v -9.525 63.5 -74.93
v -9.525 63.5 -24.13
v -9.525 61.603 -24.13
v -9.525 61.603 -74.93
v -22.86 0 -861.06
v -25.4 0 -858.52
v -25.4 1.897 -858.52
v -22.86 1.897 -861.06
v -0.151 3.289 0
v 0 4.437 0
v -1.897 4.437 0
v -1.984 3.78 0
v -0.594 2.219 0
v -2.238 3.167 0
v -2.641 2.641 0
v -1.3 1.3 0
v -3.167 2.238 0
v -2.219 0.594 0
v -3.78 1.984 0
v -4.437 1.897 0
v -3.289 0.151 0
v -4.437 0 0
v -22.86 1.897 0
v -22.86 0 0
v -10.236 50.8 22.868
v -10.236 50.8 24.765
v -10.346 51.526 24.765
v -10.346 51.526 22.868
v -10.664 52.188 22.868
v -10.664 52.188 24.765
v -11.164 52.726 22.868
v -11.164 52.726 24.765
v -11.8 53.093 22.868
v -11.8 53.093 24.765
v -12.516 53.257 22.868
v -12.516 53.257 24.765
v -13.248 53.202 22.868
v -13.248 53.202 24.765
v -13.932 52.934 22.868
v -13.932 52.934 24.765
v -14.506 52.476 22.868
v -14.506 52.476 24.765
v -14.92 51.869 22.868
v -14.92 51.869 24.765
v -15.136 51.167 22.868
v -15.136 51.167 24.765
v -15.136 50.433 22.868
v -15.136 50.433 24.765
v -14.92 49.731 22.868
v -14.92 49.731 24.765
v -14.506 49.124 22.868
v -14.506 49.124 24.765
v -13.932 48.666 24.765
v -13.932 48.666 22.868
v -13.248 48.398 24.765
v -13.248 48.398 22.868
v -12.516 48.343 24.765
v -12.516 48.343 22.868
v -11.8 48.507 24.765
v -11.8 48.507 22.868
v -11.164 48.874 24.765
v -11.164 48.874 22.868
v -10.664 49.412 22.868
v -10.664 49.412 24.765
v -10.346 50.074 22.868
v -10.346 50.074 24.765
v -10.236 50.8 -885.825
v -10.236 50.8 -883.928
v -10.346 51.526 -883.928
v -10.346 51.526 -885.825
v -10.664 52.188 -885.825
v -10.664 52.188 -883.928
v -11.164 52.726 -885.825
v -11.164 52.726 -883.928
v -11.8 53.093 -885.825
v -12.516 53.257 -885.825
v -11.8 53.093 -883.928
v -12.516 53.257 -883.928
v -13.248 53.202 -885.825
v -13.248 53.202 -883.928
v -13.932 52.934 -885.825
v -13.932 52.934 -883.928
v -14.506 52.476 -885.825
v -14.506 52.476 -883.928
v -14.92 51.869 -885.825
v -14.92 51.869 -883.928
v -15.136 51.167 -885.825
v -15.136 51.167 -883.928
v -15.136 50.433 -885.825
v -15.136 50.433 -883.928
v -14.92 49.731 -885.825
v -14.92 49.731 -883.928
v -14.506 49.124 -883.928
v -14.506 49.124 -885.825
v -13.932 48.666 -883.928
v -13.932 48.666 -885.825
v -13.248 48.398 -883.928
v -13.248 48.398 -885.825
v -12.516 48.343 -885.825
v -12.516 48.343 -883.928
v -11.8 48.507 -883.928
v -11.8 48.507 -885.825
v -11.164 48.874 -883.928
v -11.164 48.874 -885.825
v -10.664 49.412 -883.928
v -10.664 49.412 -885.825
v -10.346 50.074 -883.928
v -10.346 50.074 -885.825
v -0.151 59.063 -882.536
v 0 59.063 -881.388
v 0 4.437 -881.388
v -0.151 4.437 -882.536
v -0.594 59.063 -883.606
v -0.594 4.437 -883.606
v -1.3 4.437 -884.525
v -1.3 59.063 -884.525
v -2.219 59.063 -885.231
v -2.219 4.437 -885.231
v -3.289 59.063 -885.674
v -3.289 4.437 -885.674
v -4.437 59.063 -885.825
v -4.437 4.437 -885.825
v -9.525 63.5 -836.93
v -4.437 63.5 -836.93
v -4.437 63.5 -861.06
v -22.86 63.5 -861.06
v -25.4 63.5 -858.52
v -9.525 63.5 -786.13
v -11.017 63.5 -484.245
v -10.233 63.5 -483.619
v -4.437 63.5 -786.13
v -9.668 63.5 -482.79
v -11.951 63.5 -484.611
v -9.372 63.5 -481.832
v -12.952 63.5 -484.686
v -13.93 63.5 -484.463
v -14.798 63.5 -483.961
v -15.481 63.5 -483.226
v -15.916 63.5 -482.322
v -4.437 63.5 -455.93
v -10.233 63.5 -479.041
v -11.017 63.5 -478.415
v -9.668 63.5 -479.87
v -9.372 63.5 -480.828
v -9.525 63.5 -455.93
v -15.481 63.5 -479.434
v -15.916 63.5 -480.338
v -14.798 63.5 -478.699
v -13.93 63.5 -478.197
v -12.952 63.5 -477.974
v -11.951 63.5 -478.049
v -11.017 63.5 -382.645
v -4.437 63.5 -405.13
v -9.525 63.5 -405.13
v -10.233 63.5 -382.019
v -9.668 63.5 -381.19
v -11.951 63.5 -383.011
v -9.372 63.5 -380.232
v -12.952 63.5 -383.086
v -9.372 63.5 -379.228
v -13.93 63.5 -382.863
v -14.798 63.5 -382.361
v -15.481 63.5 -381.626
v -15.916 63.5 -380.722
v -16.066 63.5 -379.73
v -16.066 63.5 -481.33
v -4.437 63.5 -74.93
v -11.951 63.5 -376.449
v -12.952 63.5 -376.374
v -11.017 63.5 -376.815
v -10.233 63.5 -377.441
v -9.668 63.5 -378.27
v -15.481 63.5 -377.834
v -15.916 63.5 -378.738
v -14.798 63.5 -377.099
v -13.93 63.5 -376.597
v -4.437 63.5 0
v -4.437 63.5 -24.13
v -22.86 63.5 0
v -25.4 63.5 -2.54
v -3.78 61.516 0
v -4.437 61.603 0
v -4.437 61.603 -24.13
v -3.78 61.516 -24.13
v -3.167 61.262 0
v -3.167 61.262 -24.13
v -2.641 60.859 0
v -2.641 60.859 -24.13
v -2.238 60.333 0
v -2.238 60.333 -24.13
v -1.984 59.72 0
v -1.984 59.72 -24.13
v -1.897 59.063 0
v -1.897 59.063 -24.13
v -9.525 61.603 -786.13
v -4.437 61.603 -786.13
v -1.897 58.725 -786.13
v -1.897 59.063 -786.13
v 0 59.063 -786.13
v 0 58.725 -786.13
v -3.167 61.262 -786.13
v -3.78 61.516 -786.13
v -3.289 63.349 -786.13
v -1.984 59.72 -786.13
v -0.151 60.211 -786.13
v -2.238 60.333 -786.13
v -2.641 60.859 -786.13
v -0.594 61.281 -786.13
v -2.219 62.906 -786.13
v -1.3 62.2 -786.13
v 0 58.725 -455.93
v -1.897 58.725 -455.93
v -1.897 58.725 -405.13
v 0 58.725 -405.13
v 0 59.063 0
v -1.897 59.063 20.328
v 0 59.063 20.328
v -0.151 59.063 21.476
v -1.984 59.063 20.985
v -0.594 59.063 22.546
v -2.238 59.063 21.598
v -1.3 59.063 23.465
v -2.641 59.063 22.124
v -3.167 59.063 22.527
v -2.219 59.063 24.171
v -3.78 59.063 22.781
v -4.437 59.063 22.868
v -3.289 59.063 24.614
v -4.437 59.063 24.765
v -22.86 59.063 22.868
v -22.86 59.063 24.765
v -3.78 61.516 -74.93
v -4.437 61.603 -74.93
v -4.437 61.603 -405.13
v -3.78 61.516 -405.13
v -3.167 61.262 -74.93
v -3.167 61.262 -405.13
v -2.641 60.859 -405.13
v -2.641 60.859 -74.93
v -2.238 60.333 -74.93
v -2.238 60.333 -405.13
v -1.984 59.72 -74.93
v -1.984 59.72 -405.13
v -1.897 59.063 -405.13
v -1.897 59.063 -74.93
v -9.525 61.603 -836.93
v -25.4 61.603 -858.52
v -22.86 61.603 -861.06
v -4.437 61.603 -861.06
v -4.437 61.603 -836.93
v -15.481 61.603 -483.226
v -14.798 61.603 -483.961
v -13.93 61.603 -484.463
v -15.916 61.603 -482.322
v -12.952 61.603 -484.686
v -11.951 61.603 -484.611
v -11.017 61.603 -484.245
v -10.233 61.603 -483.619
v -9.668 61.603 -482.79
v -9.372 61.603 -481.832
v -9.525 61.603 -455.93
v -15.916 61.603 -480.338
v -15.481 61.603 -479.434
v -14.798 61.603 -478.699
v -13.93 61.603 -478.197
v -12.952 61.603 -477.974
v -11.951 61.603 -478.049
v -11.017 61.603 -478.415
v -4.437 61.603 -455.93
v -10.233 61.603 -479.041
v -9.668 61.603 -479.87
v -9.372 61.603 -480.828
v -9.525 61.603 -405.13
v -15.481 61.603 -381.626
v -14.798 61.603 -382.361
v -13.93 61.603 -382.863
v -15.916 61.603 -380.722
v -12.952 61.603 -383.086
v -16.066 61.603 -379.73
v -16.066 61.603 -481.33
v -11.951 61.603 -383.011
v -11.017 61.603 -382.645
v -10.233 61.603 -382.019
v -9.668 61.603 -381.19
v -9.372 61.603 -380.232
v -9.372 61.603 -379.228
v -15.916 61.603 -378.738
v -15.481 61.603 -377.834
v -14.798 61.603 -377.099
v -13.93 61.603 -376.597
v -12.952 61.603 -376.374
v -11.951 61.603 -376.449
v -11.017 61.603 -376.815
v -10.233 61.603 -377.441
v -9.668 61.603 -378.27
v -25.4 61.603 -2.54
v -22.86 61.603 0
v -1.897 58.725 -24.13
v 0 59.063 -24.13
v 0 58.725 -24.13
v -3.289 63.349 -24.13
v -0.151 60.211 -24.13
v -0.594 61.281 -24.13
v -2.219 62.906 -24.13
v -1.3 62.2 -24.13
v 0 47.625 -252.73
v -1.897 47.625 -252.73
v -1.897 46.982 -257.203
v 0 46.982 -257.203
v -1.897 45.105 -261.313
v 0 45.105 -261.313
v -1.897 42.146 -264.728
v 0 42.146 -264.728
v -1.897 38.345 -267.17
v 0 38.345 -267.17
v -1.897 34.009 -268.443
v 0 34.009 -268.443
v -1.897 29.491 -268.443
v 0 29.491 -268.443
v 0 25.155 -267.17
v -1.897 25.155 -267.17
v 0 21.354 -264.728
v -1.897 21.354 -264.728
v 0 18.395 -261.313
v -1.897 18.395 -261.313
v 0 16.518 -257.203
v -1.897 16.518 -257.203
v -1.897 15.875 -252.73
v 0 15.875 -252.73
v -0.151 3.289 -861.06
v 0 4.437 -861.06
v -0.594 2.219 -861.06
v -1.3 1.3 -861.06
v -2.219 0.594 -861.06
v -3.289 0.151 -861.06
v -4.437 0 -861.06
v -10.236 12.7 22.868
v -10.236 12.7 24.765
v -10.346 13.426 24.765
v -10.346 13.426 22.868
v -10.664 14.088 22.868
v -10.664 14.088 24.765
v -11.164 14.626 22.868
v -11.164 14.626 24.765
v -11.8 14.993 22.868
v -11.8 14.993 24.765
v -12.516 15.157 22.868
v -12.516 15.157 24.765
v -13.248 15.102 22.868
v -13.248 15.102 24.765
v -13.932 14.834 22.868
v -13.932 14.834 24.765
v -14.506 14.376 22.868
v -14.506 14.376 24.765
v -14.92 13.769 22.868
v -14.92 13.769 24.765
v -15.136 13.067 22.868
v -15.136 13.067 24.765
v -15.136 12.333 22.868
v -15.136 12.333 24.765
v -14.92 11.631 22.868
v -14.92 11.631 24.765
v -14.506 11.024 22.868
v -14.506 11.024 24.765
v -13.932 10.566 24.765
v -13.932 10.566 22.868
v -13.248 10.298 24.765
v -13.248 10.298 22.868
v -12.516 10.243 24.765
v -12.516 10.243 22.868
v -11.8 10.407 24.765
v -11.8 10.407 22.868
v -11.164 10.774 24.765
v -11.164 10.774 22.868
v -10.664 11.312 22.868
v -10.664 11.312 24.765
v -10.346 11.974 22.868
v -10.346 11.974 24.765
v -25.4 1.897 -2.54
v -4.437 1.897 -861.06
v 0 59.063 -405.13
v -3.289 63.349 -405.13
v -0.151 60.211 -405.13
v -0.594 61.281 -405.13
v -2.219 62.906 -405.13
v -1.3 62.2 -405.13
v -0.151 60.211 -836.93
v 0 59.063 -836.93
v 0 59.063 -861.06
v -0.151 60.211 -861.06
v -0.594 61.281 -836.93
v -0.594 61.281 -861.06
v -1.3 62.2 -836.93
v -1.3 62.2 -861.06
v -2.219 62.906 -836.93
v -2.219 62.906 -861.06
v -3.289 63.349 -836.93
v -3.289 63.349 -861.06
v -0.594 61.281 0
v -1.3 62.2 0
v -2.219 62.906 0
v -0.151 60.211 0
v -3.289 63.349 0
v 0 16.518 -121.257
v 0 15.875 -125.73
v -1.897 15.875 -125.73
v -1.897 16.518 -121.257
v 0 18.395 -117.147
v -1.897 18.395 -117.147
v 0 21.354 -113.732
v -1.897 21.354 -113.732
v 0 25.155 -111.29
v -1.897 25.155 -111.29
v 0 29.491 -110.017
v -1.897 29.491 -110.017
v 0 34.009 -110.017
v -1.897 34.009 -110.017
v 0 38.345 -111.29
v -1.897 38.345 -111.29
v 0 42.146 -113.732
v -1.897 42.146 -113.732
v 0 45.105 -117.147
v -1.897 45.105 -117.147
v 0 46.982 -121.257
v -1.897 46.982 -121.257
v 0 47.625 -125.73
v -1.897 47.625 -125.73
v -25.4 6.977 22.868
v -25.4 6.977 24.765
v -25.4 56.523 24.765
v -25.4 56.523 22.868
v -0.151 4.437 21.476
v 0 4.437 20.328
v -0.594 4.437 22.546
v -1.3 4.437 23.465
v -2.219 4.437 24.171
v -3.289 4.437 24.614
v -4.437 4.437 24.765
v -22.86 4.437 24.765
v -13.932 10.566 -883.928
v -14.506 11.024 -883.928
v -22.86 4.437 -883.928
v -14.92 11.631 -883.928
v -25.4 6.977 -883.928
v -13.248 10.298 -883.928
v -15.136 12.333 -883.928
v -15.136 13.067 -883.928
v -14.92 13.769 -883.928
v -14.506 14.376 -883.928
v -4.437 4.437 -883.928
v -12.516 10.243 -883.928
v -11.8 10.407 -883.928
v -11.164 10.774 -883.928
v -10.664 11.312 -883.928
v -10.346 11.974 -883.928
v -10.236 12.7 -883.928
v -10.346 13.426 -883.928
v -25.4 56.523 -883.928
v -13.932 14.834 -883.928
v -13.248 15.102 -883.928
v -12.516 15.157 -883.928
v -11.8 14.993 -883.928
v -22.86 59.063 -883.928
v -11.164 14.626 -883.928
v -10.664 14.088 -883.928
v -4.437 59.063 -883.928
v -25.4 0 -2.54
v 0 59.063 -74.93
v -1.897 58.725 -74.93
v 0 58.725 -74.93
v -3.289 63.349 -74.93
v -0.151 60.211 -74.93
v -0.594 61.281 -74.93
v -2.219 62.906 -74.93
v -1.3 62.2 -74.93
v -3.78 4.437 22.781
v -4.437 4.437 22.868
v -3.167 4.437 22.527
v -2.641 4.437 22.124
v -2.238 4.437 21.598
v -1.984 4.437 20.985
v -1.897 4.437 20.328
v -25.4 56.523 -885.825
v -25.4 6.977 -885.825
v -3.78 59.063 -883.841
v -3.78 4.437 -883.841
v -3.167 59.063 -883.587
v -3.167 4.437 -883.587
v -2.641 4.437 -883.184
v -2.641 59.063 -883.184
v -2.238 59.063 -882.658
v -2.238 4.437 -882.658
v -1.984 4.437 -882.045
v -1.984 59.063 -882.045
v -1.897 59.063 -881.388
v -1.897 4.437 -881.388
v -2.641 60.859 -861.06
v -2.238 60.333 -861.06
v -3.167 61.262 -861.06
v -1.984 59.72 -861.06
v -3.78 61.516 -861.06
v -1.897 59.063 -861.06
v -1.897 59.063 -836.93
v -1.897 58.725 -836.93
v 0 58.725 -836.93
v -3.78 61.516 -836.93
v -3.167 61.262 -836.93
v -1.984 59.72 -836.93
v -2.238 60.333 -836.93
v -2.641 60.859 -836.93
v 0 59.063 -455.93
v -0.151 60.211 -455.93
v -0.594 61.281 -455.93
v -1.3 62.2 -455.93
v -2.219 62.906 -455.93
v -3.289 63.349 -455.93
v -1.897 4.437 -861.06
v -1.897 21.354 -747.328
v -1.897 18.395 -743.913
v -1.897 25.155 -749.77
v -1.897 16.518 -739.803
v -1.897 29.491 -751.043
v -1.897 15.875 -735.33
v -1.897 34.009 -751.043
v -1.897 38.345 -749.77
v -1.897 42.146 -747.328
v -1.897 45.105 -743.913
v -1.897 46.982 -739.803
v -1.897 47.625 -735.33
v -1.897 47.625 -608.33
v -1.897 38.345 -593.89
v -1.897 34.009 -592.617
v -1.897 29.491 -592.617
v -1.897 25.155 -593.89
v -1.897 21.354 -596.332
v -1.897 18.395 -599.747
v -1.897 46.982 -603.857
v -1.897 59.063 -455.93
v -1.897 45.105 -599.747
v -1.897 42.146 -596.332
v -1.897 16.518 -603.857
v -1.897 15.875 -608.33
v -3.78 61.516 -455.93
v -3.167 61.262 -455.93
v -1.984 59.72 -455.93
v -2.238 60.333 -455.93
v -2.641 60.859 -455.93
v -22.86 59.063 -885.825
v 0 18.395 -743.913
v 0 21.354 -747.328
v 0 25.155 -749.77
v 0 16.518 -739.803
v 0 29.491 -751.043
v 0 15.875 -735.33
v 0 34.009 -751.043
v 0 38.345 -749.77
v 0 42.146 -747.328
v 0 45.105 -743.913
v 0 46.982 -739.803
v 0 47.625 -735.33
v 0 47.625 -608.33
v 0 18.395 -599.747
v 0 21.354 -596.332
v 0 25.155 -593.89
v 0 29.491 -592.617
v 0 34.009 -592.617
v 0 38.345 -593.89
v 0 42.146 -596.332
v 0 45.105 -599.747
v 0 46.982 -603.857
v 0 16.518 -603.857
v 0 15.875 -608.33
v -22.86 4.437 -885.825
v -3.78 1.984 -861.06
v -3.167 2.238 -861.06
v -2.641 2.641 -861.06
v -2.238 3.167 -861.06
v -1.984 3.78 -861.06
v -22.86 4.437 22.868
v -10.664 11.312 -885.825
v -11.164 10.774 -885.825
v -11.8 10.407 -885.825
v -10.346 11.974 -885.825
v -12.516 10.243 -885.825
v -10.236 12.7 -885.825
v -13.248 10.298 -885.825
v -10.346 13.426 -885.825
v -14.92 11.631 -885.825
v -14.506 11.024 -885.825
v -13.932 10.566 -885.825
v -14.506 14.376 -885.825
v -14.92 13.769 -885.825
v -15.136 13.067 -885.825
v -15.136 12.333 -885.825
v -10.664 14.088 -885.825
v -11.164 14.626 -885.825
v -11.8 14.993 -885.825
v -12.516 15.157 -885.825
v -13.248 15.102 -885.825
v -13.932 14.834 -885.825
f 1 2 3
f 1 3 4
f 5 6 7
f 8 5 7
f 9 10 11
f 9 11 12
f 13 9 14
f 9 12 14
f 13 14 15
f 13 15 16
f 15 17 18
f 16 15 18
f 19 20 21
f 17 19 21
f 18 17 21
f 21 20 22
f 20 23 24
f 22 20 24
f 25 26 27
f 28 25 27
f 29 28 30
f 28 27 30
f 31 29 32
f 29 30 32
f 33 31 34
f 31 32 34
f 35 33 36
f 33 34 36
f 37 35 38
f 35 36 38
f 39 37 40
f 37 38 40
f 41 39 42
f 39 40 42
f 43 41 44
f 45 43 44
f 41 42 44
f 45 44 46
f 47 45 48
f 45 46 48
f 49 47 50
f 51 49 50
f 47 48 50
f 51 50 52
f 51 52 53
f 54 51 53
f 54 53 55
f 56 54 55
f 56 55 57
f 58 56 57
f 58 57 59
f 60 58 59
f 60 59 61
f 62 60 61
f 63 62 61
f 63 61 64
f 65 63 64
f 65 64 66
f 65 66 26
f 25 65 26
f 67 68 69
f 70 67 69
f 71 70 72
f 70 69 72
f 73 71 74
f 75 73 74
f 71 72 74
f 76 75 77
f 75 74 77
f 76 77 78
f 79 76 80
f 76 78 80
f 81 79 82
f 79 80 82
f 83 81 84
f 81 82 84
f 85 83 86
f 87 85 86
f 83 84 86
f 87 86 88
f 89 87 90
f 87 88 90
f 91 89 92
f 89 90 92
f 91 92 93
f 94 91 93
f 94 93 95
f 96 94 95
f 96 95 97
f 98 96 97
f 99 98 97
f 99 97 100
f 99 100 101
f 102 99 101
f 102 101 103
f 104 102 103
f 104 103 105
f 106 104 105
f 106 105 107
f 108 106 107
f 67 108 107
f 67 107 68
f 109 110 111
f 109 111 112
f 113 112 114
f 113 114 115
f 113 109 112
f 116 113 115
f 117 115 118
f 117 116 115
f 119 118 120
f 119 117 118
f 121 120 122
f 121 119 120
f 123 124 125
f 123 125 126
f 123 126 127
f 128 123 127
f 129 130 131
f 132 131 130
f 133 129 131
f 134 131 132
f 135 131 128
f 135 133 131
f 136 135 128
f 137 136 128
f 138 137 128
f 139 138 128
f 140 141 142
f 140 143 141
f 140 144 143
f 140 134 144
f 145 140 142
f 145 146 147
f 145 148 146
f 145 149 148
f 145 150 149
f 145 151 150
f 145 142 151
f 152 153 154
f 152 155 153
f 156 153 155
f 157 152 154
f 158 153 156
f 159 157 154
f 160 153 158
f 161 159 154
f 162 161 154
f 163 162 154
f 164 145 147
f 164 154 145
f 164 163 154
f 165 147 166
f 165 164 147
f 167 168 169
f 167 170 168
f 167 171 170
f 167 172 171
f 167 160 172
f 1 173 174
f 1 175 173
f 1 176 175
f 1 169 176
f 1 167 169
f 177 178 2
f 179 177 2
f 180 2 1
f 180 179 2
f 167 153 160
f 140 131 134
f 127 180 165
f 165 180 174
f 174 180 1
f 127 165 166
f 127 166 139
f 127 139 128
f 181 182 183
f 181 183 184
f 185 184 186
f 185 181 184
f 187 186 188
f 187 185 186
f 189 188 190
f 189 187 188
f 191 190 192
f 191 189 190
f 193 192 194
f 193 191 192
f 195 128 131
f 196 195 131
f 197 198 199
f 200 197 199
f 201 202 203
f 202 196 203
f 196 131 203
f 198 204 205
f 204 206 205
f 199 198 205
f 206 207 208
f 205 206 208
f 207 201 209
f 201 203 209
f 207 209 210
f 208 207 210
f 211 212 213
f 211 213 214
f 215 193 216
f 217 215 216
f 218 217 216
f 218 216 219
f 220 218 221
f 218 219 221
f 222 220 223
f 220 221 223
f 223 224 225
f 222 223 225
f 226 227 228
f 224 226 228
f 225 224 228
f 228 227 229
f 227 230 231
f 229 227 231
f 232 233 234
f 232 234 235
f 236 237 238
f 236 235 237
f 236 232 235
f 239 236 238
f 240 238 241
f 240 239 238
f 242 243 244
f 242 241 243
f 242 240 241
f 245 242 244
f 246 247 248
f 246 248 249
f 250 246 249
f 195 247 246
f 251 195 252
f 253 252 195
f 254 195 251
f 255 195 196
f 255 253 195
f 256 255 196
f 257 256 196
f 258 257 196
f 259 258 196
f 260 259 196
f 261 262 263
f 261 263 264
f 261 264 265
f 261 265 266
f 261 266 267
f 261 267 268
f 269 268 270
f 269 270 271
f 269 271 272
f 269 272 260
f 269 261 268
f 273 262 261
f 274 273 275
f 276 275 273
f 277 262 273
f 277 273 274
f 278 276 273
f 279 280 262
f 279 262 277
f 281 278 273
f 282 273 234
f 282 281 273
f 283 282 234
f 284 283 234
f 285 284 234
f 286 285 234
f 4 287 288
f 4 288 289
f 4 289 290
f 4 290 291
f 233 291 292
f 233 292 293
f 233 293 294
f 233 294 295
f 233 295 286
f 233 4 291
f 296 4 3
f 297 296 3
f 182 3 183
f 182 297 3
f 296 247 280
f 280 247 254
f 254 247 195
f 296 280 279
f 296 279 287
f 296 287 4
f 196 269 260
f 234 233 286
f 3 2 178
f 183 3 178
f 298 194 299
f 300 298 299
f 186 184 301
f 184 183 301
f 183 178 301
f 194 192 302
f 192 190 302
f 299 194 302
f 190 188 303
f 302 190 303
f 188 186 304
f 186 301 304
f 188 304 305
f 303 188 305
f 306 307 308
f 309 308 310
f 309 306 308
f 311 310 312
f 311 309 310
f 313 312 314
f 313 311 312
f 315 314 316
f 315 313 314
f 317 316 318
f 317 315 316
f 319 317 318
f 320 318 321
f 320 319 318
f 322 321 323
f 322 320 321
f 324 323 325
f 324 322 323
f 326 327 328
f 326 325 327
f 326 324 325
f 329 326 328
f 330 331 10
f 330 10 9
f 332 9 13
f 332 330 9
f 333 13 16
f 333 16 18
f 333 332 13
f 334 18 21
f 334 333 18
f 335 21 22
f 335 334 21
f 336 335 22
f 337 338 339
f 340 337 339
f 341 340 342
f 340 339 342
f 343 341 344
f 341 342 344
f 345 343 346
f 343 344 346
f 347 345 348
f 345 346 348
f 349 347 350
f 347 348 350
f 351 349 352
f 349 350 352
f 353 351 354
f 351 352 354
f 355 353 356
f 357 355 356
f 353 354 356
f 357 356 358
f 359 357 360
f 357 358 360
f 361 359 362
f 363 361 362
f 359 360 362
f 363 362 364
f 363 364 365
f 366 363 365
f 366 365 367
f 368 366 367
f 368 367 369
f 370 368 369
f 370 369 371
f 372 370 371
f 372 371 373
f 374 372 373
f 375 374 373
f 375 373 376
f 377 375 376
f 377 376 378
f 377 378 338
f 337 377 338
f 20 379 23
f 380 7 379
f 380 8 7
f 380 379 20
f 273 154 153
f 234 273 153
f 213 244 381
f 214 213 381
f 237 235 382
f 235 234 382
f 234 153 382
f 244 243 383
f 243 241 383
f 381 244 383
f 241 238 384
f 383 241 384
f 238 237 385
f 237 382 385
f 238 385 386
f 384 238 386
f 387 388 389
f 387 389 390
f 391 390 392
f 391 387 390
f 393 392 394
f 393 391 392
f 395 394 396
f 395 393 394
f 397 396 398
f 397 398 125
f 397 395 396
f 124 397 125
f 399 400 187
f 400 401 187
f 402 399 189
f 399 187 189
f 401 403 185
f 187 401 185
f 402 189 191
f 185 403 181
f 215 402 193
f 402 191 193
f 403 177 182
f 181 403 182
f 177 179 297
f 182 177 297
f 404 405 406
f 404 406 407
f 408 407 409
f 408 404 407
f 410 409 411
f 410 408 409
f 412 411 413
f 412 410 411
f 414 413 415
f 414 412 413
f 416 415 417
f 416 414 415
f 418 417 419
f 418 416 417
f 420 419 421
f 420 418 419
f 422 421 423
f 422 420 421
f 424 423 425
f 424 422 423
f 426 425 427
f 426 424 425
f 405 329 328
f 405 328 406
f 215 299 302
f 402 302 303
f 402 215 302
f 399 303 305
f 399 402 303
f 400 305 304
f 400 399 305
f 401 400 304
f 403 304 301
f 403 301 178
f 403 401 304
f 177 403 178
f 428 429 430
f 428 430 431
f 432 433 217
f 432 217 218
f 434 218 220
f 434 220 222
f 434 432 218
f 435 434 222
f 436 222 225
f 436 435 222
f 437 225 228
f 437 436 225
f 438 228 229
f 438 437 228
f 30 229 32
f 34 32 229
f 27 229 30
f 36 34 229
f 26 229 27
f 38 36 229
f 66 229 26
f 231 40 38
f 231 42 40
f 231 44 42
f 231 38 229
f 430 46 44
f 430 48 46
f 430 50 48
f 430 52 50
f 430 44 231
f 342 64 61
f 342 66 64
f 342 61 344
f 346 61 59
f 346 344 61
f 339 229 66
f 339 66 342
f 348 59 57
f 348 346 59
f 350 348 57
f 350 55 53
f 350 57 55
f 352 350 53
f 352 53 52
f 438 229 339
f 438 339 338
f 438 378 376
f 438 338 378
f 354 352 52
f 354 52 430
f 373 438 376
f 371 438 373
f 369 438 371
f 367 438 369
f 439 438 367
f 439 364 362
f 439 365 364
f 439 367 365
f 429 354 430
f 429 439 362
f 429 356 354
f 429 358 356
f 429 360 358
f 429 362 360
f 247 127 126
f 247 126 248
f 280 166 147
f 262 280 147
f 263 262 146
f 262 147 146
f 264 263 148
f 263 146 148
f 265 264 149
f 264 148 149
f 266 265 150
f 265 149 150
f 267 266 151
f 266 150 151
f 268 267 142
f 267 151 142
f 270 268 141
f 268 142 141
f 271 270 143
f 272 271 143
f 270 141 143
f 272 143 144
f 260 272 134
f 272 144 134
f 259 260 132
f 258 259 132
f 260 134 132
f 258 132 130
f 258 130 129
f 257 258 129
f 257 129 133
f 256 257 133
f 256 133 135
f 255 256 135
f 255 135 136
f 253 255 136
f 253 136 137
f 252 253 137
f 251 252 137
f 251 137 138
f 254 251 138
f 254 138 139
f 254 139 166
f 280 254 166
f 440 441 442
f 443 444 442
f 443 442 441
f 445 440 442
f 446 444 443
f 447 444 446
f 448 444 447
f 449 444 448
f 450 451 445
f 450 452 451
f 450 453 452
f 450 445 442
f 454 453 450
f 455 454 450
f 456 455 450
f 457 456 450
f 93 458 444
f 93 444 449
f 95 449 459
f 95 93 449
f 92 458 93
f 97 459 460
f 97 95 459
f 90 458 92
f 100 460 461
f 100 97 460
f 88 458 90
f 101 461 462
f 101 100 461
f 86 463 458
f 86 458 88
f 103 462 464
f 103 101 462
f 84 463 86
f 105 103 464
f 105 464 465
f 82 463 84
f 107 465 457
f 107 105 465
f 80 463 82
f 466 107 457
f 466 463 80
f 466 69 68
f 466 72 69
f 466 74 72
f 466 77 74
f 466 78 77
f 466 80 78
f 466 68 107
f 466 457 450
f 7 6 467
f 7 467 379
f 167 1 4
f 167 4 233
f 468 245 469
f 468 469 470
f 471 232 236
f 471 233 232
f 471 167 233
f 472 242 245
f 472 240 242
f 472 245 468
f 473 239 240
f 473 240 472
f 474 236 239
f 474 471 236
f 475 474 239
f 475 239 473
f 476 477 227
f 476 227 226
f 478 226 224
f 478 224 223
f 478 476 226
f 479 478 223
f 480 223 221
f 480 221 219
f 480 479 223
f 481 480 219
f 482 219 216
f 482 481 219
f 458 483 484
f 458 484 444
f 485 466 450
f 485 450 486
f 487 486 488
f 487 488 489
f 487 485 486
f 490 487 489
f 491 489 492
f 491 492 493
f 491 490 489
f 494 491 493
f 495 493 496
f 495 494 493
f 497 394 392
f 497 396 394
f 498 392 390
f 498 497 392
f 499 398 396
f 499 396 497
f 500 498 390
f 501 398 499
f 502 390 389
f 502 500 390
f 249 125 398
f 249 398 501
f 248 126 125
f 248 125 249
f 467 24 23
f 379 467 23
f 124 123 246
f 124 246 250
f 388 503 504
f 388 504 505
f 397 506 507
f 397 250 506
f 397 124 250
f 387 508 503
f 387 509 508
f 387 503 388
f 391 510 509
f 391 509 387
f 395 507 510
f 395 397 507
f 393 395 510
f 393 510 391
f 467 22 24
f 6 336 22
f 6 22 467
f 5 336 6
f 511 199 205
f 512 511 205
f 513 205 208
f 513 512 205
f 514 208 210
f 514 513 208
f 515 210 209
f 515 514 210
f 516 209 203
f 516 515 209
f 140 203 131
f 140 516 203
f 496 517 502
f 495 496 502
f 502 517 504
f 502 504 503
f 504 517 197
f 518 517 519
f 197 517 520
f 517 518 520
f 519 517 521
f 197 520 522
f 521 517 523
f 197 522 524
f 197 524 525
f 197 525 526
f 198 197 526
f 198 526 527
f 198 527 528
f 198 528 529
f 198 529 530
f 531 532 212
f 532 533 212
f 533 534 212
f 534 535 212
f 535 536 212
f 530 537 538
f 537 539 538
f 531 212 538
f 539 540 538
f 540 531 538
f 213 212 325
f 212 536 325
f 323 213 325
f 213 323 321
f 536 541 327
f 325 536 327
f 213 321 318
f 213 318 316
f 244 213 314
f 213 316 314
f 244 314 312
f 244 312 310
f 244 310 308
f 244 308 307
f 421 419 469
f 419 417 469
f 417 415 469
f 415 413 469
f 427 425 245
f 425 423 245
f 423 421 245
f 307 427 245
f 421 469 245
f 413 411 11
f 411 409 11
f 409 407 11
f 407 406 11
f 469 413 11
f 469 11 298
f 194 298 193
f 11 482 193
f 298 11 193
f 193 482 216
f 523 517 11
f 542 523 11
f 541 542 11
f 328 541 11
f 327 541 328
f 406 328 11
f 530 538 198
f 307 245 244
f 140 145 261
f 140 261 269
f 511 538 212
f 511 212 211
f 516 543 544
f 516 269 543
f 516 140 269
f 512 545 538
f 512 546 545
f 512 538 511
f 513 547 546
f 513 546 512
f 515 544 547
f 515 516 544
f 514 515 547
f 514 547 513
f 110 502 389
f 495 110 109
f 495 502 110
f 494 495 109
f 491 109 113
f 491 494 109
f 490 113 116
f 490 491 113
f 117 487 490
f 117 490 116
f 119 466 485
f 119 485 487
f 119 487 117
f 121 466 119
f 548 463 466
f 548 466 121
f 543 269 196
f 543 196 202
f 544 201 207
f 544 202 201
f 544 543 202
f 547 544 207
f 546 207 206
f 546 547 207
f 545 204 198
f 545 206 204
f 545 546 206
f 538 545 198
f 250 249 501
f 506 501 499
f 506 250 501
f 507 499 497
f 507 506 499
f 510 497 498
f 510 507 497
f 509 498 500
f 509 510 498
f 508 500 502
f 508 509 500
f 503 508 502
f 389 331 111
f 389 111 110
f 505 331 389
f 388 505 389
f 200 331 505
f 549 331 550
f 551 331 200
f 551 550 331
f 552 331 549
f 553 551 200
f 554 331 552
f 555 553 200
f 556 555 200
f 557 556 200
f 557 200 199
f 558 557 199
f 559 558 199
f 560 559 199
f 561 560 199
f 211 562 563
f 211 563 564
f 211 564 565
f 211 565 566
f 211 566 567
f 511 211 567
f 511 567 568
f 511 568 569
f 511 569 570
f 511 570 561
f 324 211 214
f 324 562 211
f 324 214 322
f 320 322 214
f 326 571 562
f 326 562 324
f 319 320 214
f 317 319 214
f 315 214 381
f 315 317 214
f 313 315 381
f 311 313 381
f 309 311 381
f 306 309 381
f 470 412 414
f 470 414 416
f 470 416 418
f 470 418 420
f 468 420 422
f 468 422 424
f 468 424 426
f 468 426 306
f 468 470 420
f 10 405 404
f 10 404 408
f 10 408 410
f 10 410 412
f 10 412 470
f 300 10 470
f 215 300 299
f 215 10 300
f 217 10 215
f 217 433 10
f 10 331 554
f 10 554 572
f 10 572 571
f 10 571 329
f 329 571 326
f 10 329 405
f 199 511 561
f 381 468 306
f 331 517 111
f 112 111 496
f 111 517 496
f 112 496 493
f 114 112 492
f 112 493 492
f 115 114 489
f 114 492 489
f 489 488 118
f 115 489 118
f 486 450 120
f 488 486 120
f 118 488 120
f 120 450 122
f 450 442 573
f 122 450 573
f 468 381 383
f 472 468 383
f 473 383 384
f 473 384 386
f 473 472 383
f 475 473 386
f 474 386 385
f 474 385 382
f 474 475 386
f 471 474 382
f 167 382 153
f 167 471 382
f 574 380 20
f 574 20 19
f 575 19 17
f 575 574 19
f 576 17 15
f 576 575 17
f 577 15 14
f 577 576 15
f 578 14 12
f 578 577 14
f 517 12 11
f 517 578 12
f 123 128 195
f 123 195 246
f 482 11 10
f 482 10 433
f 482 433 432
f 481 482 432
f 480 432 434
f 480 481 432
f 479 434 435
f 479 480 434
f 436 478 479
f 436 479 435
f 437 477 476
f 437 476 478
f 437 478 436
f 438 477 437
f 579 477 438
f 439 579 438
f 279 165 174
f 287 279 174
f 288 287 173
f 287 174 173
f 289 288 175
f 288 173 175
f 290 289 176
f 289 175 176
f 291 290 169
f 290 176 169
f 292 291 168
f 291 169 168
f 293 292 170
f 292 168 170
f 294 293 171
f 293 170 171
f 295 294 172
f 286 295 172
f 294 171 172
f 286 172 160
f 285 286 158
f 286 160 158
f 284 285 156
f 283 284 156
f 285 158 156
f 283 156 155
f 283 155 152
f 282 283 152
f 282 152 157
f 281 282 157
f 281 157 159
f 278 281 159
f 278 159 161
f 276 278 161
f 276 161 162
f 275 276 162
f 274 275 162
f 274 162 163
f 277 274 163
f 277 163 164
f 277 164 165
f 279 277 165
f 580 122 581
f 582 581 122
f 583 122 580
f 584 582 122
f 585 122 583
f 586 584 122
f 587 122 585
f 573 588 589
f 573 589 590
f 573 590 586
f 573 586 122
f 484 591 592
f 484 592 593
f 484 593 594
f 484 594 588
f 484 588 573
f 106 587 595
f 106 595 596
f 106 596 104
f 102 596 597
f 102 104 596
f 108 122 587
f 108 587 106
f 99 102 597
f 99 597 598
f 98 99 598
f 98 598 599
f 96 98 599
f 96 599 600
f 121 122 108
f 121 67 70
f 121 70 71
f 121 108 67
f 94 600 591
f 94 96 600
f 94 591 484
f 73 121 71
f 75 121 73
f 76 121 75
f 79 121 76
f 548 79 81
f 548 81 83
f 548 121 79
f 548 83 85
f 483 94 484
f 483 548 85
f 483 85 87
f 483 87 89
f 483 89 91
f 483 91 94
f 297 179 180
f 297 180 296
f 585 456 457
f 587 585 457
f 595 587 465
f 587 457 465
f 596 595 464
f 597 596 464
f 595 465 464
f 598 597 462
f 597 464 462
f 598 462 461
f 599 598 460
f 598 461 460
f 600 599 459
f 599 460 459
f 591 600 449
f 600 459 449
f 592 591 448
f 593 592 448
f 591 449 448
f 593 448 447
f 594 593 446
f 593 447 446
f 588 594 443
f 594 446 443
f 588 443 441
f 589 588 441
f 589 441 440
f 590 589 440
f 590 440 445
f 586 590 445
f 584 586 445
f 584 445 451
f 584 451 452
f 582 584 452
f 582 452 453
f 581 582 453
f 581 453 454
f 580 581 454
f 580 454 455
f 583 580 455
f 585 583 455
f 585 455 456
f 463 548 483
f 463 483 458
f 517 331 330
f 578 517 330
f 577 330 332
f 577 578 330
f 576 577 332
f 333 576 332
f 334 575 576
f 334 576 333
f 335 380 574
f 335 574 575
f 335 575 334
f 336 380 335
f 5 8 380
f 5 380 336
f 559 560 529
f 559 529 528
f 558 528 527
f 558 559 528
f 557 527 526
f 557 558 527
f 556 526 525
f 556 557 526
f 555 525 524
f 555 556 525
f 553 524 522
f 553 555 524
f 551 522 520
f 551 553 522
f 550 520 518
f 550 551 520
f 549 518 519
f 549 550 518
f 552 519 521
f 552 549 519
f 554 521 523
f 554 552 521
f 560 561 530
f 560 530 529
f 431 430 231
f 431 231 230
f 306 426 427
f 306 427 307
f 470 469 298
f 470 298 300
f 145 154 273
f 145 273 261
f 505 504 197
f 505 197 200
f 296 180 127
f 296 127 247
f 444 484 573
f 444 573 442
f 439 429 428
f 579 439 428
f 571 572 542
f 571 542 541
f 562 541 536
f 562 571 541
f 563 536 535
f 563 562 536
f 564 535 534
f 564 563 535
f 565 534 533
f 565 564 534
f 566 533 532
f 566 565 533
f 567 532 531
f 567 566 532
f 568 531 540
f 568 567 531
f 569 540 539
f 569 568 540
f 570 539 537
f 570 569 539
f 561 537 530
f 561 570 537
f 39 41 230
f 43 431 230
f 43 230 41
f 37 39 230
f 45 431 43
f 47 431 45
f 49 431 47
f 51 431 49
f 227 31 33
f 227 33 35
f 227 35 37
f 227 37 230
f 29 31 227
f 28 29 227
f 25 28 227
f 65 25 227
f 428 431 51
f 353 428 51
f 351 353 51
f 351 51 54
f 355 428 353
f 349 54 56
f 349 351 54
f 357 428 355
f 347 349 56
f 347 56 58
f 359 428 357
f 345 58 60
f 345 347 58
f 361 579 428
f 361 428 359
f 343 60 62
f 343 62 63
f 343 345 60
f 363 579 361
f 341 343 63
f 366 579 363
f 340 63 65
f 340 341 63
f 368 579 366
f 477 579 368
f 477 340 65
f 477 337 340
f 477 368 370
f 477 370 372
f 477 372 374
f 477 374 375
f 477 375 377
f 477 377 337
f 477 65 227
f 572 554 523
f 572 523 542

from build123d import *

# Parameters (mm, degrees)
SKETCH1_W                      = 861.06
SKETCH1_H                      = 63.5
BASE_FLANGE1_DEPTH             = 1.89738
EDGE_FLANGE1_STRIP_W           = 12.66952
EDGE_FLANGE1_STRIP_H           = 1.89738
EDGE_FLANGE1_STRIP_CUT_DEPTH   = 861.06
EDGE_FLANGE1_STRIP_2_W         = 12.66952
EDGE_FLANGE1_STRIP_2_H         = 1.89738
EDGE_FLANGE1_STRIP_CUT_2_DEPTH = 861.06
EDGE_FLANGE1_DEPTH             = 861.06
EDGE_FLANGE1_BEND_DEPTH        = 861.06
SKETCH12_W                     = 1.89738
SKETCH12_H                     = 54.62524
BOSS_EXTRUDE1_DEPTH            = 24.765
EDGE_FLANGE2_STRIP_W           = 12.66952
EDGE_FLANGE2_STRIP_H           = 1.89738
EDGE_FLANGE2_STRIP_CUT_DEPTH   = 54.62524
EDGE_FLANGE2_STRIP_2_W         = 12.66952
EDGE_FLANGE2_STRIP_2_H         = 1.89738
EDGE_FLANGE2_STRIP_CUT_2_DEPTH = 54.62524
EDGE_FLANGE2_DEPTH             = 54.62524
EDGE_FLANGE2_BEND_DEPTH        = 54.62524
SKETCH16_W                     = 9.525
SKETCH16_H                     = 50.8
CUT_EXTRUDE1_DEPTH             = 4.7752
LPATTERN1_COUNT                = 3
LPATTERN1_PITCH                = 381
SKETCH17_R                     = 3.3655
CUT_EXTRUDE2_DEPTH             = 2.54
CUT_EXTRUDE3_DEPTH             = 2.54
LPATTERN2_COUNT                = 2
LPATTERN2_PITCH                = 482.6
SKETCH25_R                     = 2.4638
CUT_EXTRUDE4_DEPTH             = 914.154728455
CHAMFER1_SIZE                  = 2.54


# Sheet-metal steps are written as plain solids
with BuildPart() as part:
    # Sketch1 → Base-Flange1 (new body)
    with BuildSketch(Plane(origin=(0, 0, 0), x_dir=(0, 0, -1), z_dir=(1, 0, 0))):
        with Locations((430.53, 31.75)):
            Rectangle(SKETCH1_W, SKETCH1_H)
    extrude(amount=-BASE_FLANGE1_DEPTH)

    # Edge-Flange1 strip (across the edge) → Edge-Flange1 strip cut (cut)
    with BuildSketch(Plane(origin=(-1.89738, 63.5, 0), x_dir=(0, -1, 0), z_dir=(0, 0, -1))):
        with Locations((-1.89738, -0.94869)):
            Rectangle(EDGE_FLANGE1_STRIP_W, EDGE_FLANGE1_STRIP_H)
    extrude(amount=EDGE_FLANGE1_STRIP_CUT_DEPTH, mode=Mode.SUBTRACT)

    # Edge-Flange1 strip 2 (across the edge) → Edge-Flange1 strip cut 2 (cut)
    with BuildSketch(Plane(origin=(-1.89738, 0, -861.06), x_dir=(0, 1, 0), z_dir=(0, 0, 1))):
        with Locations((-1.89738, -0.94869)):
            Rectangle(EDGE_FLANGE1_STRIP_2_W, EDGE_FLANGE1_STRIP_2_H)
    extrude(amount=EDGE_FLANGE1_STRIP_CUT_2_DEPTH, mode=Mode.SUBTRACT)

    # Edge-Flange1 section (across the edge) → Edge-Flange1 (add)
    with BuildSketch(Plane(origin=(-1.89738, 63.5, 0), x_dir=(0, -1, 0), z_dir=(0, 0, -1))):
        with BuildLine():
            Line((0, 2.54), (0, 23.50262))
            Line((0, 23.50262), (1.89738, 23.50262))
            Line((1.89738, 23.50262), (1.89738, 2.54))
            ThreePointArc((1.89738, 2.54), (2.641328776, 0.743948776), (4.43738, 0))
            Line((4.43738, 0), (4.43738, -1.89738))
            ThreePointArc((4.43738, -1.89738), (1.299678511, -0.597701489), (0, 2.54))
        make_face()
    extrude(amount=EDGE_FLANGE1_DEPTH)

    # Edge-Flange1 section 2 (across the edge) → Edge-Flange1 bend (add)
    with BuildSketch(Plane(origin=(-1.89738, 0, -861.06), x_dir=(0, 1, 0), z_dir=(0, 0, 1))):
        with BuildLine():
            Line((0, 2.54), (0, 23.50262))
            Line((0, 23.50262), (1.89738, 23.50262))
            Line((1.89738, 23.50262), (1.89738, 2.54))
            ThreePointArc((1.89738, 2.54), (2.641328776, 0.743948776), (4.43738, 0))
            Line((4.43738, 0), (4.43738, -1.89738))
            ThreePointArc((4.43738, -1.89738), (1.299678511, -0.597701489), (0, 2.54))
        make_face()
    extrude(amount=EDGE_FLANGE1_BEND_DEPTH)

    # Sketch12 → Boss-Extrude1 (add)
    with BuildSketch(Plane.XY):
        with Locations((-0.94869, 31.75)):
            Rectangle(SKETCH12_W, SKETCH12_H)
    boss_extrude1 = extrude(amount=BOSS_EXTRUDE1_DEPTH)

    # Mirror1: Boss-Extrude1 across plane
    add(boss_extrude1.mirror(Plane.XY.offset(-430.53)))

    # Edge-Flange2 strip (across the edge) → Edge-Flange2 strip cut (cut)
    with BuildSketch(Plane(origin=(-1.89738, 4.43738, 24.765), x_dir=(0, 0, -1), z_dir=(0, 1, 0))):
        with Locations((-1.89738, -0.94869)):
            Rectangle(EDGE_FLANGE2_STRIP_W, EDGE_FLANGE2_STRIP_H)
    extrude(amount=EDGE_FLANGE2_STRIP_CUT_DEPTH, mode=Mode.SUBTRACT)

    # Edge-Flange2 strip 2 (across the edge) → Edge-Flange2 strip cut 2 (cut)
    with BuildSketch(Plane(origin=(-1.89738, 59.06262, -885.825), x_dir=(0, 0, 1), z_dir=(0, -1, 0))):
        with Locations((-1.89738, -0.94869)):
            Rectangle(EDGE_FLANGE2_STRIP_2_W, EDGE_FLANGE2_STRIP_2_H)
    extrude(amount=EDGE_FLANGE2_STRIP_CUT_2_DEPTH, mode=Mode.SUBTRACT)

    # Edge-Flange2 section (across the edge) → Edge-Flange2 (add)
    with BuildSketch(Plane(origin=(-1.89738, 4.43738, 24.765), x_dir=(0, 0, -1), z_dir=(0, 1, 0))):
        with BuildLine():
            Line((0, 2.54), (0, 23.50262))
            Line((0, 23.50262), (1.89738, 23.50262))
            Line((1.89738, 23.50262), (1.89738, 2.54))
            ThreePointArc((1.89738, 2.54), (2.641328776, 0.743948776), (4.43738, 0))
            Line((4.43738, 0), (4.43738, -1.89738))
            ThreePointArc((4.43738, -1.89738), (1.299678511, -0.597701489), (0, 2.54))
        make_face()
    extrude(amount=EDGE_FLANGE2_DEPTH)

    # Edge-Flange2 section 2 (across the edge) → Edge-Flange2 bend (add)
    with BuildSketch(Plane(origin=(-1.89738, 59.06262, -885.825), x_dir=(0, 0, 1), z_dir=(0, -1, 0))):
        with BuildLine():
            Line((0, 2.54), (0, 23.50262))
            Line((0, 23.50262), (1.89738, 23.50262))
            Line((1.89738, 23.50262), (1.89738, 2.54))
            ThreePointArc((1.89738, 2.54), (2.641328776, 0.743948776), (4.43738, 0))
            Line((4.43738, 0), (4.43738, -1.89738))
            ThreePointArc((4.43738, -1.89738), (1.299678511, -0.597701489), (0, 2.54))
        make_face()
    extrude(amount=EDGE_FLANGE2_BEND_DEPTH)

    # Sketch16 → Cut-Extrude1 (cut)
    with BuildSketch(Plane(origin=(0, 63.5, 0), x_dir=(1, 0, 0), z_dir=(0, 1, 0))):
        with Locations((-4.7625, 49.53)):
            Rectangle(SKETCH16_W, SKETCH16_H)
    cut_extrude1 = extrude(amount=-CUT_EXTRUDE1_DEPTH, mode=Mode.SUBTRACT)

    # LPattern1: Cut-Extrude1 ×3
    with Locations(*[(0, 0, -i * LPATTERN1_PITCH) for i in range(1, LPATTERN1_COUNT)]):
        add(cut_extrude1, mode=Mode.SUBTRACT)

    # Sketch17 → Cut-Extrude2 (cut)
    with BuildSketch(Plane(origin=(0, 63.5, 0), x_dir=(1, 0, 0), z_dir=(0, 1, 0))):
        with Locations(Location((-12.7, 481.33, 0), (0, 0, 180))):
            Circle(SKETCH17_R)
        with Locations(Location((-12.7, 379.73, 0), (0, 0, 180))):
            Circle(SKETCH17_R)
    extrude(amount=-CUT_EXTRUDE2_DEPTH, mode=Mode.SUBTRACT)

    # Sketch18 → Cut-Extrude3 (cut)
    with BuildSketch(Plane(origin=(0, 0, 0), x_dir=(0, 0, -1), z_dir=(1, 0, 0))):
        with BuildLine():
            Line((125.73, 47.625), (252.73, 47.625))
            ThreePointArc((252.73, 47.625), (268.605, 31.75), (252.73, 15.875))
            Line((252.73, 15.875), (125.73, 15.875))
            ThreePointArc((125.73, 15.875), (109.855, 31.75), (125.73, 47.625))
        make_face()
    cut_extrude3 = extrude(amount=-CUT_EXTRUDE3_DEPTH, mode=Mode.SUBTRACT)

    # LPattern2: Cut-Extrude3 ×2
    with Locations(*[(0, 0, -i * LPATTERN2_PITCH) for i in range(1, LPATTERN2_COUNT)]):
        add(cut_extrude3, mode=Mode.SUBTRACT)

    # Sketch25 → Cut-Extrude4 (cut, through all)
    with BuildSketch(Plane.XY.offset(24.765)):
        with Locations((-12.7, 50.8)):
            Circle(SKETCH25_R)
        with Locations((-12.7, 12.7)):
            Circle(SKETCH25_R)
    extrude(amount=-CUT_EXTRUDE4_DEPTH, mode=Mode.SUBTRACT)

    # Chamfer1
    chamfer1_edges = [part.edges().sort_by_distance(p)[0] for p in [
        (-25.4, 4.43738, 23.81631),
        (-25.4, 59.06262, 23.81631),
        (-25.4, 59.06262, -884.87631),
        (-25.4, 4.43738, -884.87631),
        (-25.4, 62.55131, 0),
        (-25.4, 62.55131, -861.06),
        (-25.4, 0.94869, -861.06),
        (-25.4, 0.94869, 0),
    ]]
    chamfer(chamfer1_edges, length=CHAMFER1_SIZE)


solid = part.part
